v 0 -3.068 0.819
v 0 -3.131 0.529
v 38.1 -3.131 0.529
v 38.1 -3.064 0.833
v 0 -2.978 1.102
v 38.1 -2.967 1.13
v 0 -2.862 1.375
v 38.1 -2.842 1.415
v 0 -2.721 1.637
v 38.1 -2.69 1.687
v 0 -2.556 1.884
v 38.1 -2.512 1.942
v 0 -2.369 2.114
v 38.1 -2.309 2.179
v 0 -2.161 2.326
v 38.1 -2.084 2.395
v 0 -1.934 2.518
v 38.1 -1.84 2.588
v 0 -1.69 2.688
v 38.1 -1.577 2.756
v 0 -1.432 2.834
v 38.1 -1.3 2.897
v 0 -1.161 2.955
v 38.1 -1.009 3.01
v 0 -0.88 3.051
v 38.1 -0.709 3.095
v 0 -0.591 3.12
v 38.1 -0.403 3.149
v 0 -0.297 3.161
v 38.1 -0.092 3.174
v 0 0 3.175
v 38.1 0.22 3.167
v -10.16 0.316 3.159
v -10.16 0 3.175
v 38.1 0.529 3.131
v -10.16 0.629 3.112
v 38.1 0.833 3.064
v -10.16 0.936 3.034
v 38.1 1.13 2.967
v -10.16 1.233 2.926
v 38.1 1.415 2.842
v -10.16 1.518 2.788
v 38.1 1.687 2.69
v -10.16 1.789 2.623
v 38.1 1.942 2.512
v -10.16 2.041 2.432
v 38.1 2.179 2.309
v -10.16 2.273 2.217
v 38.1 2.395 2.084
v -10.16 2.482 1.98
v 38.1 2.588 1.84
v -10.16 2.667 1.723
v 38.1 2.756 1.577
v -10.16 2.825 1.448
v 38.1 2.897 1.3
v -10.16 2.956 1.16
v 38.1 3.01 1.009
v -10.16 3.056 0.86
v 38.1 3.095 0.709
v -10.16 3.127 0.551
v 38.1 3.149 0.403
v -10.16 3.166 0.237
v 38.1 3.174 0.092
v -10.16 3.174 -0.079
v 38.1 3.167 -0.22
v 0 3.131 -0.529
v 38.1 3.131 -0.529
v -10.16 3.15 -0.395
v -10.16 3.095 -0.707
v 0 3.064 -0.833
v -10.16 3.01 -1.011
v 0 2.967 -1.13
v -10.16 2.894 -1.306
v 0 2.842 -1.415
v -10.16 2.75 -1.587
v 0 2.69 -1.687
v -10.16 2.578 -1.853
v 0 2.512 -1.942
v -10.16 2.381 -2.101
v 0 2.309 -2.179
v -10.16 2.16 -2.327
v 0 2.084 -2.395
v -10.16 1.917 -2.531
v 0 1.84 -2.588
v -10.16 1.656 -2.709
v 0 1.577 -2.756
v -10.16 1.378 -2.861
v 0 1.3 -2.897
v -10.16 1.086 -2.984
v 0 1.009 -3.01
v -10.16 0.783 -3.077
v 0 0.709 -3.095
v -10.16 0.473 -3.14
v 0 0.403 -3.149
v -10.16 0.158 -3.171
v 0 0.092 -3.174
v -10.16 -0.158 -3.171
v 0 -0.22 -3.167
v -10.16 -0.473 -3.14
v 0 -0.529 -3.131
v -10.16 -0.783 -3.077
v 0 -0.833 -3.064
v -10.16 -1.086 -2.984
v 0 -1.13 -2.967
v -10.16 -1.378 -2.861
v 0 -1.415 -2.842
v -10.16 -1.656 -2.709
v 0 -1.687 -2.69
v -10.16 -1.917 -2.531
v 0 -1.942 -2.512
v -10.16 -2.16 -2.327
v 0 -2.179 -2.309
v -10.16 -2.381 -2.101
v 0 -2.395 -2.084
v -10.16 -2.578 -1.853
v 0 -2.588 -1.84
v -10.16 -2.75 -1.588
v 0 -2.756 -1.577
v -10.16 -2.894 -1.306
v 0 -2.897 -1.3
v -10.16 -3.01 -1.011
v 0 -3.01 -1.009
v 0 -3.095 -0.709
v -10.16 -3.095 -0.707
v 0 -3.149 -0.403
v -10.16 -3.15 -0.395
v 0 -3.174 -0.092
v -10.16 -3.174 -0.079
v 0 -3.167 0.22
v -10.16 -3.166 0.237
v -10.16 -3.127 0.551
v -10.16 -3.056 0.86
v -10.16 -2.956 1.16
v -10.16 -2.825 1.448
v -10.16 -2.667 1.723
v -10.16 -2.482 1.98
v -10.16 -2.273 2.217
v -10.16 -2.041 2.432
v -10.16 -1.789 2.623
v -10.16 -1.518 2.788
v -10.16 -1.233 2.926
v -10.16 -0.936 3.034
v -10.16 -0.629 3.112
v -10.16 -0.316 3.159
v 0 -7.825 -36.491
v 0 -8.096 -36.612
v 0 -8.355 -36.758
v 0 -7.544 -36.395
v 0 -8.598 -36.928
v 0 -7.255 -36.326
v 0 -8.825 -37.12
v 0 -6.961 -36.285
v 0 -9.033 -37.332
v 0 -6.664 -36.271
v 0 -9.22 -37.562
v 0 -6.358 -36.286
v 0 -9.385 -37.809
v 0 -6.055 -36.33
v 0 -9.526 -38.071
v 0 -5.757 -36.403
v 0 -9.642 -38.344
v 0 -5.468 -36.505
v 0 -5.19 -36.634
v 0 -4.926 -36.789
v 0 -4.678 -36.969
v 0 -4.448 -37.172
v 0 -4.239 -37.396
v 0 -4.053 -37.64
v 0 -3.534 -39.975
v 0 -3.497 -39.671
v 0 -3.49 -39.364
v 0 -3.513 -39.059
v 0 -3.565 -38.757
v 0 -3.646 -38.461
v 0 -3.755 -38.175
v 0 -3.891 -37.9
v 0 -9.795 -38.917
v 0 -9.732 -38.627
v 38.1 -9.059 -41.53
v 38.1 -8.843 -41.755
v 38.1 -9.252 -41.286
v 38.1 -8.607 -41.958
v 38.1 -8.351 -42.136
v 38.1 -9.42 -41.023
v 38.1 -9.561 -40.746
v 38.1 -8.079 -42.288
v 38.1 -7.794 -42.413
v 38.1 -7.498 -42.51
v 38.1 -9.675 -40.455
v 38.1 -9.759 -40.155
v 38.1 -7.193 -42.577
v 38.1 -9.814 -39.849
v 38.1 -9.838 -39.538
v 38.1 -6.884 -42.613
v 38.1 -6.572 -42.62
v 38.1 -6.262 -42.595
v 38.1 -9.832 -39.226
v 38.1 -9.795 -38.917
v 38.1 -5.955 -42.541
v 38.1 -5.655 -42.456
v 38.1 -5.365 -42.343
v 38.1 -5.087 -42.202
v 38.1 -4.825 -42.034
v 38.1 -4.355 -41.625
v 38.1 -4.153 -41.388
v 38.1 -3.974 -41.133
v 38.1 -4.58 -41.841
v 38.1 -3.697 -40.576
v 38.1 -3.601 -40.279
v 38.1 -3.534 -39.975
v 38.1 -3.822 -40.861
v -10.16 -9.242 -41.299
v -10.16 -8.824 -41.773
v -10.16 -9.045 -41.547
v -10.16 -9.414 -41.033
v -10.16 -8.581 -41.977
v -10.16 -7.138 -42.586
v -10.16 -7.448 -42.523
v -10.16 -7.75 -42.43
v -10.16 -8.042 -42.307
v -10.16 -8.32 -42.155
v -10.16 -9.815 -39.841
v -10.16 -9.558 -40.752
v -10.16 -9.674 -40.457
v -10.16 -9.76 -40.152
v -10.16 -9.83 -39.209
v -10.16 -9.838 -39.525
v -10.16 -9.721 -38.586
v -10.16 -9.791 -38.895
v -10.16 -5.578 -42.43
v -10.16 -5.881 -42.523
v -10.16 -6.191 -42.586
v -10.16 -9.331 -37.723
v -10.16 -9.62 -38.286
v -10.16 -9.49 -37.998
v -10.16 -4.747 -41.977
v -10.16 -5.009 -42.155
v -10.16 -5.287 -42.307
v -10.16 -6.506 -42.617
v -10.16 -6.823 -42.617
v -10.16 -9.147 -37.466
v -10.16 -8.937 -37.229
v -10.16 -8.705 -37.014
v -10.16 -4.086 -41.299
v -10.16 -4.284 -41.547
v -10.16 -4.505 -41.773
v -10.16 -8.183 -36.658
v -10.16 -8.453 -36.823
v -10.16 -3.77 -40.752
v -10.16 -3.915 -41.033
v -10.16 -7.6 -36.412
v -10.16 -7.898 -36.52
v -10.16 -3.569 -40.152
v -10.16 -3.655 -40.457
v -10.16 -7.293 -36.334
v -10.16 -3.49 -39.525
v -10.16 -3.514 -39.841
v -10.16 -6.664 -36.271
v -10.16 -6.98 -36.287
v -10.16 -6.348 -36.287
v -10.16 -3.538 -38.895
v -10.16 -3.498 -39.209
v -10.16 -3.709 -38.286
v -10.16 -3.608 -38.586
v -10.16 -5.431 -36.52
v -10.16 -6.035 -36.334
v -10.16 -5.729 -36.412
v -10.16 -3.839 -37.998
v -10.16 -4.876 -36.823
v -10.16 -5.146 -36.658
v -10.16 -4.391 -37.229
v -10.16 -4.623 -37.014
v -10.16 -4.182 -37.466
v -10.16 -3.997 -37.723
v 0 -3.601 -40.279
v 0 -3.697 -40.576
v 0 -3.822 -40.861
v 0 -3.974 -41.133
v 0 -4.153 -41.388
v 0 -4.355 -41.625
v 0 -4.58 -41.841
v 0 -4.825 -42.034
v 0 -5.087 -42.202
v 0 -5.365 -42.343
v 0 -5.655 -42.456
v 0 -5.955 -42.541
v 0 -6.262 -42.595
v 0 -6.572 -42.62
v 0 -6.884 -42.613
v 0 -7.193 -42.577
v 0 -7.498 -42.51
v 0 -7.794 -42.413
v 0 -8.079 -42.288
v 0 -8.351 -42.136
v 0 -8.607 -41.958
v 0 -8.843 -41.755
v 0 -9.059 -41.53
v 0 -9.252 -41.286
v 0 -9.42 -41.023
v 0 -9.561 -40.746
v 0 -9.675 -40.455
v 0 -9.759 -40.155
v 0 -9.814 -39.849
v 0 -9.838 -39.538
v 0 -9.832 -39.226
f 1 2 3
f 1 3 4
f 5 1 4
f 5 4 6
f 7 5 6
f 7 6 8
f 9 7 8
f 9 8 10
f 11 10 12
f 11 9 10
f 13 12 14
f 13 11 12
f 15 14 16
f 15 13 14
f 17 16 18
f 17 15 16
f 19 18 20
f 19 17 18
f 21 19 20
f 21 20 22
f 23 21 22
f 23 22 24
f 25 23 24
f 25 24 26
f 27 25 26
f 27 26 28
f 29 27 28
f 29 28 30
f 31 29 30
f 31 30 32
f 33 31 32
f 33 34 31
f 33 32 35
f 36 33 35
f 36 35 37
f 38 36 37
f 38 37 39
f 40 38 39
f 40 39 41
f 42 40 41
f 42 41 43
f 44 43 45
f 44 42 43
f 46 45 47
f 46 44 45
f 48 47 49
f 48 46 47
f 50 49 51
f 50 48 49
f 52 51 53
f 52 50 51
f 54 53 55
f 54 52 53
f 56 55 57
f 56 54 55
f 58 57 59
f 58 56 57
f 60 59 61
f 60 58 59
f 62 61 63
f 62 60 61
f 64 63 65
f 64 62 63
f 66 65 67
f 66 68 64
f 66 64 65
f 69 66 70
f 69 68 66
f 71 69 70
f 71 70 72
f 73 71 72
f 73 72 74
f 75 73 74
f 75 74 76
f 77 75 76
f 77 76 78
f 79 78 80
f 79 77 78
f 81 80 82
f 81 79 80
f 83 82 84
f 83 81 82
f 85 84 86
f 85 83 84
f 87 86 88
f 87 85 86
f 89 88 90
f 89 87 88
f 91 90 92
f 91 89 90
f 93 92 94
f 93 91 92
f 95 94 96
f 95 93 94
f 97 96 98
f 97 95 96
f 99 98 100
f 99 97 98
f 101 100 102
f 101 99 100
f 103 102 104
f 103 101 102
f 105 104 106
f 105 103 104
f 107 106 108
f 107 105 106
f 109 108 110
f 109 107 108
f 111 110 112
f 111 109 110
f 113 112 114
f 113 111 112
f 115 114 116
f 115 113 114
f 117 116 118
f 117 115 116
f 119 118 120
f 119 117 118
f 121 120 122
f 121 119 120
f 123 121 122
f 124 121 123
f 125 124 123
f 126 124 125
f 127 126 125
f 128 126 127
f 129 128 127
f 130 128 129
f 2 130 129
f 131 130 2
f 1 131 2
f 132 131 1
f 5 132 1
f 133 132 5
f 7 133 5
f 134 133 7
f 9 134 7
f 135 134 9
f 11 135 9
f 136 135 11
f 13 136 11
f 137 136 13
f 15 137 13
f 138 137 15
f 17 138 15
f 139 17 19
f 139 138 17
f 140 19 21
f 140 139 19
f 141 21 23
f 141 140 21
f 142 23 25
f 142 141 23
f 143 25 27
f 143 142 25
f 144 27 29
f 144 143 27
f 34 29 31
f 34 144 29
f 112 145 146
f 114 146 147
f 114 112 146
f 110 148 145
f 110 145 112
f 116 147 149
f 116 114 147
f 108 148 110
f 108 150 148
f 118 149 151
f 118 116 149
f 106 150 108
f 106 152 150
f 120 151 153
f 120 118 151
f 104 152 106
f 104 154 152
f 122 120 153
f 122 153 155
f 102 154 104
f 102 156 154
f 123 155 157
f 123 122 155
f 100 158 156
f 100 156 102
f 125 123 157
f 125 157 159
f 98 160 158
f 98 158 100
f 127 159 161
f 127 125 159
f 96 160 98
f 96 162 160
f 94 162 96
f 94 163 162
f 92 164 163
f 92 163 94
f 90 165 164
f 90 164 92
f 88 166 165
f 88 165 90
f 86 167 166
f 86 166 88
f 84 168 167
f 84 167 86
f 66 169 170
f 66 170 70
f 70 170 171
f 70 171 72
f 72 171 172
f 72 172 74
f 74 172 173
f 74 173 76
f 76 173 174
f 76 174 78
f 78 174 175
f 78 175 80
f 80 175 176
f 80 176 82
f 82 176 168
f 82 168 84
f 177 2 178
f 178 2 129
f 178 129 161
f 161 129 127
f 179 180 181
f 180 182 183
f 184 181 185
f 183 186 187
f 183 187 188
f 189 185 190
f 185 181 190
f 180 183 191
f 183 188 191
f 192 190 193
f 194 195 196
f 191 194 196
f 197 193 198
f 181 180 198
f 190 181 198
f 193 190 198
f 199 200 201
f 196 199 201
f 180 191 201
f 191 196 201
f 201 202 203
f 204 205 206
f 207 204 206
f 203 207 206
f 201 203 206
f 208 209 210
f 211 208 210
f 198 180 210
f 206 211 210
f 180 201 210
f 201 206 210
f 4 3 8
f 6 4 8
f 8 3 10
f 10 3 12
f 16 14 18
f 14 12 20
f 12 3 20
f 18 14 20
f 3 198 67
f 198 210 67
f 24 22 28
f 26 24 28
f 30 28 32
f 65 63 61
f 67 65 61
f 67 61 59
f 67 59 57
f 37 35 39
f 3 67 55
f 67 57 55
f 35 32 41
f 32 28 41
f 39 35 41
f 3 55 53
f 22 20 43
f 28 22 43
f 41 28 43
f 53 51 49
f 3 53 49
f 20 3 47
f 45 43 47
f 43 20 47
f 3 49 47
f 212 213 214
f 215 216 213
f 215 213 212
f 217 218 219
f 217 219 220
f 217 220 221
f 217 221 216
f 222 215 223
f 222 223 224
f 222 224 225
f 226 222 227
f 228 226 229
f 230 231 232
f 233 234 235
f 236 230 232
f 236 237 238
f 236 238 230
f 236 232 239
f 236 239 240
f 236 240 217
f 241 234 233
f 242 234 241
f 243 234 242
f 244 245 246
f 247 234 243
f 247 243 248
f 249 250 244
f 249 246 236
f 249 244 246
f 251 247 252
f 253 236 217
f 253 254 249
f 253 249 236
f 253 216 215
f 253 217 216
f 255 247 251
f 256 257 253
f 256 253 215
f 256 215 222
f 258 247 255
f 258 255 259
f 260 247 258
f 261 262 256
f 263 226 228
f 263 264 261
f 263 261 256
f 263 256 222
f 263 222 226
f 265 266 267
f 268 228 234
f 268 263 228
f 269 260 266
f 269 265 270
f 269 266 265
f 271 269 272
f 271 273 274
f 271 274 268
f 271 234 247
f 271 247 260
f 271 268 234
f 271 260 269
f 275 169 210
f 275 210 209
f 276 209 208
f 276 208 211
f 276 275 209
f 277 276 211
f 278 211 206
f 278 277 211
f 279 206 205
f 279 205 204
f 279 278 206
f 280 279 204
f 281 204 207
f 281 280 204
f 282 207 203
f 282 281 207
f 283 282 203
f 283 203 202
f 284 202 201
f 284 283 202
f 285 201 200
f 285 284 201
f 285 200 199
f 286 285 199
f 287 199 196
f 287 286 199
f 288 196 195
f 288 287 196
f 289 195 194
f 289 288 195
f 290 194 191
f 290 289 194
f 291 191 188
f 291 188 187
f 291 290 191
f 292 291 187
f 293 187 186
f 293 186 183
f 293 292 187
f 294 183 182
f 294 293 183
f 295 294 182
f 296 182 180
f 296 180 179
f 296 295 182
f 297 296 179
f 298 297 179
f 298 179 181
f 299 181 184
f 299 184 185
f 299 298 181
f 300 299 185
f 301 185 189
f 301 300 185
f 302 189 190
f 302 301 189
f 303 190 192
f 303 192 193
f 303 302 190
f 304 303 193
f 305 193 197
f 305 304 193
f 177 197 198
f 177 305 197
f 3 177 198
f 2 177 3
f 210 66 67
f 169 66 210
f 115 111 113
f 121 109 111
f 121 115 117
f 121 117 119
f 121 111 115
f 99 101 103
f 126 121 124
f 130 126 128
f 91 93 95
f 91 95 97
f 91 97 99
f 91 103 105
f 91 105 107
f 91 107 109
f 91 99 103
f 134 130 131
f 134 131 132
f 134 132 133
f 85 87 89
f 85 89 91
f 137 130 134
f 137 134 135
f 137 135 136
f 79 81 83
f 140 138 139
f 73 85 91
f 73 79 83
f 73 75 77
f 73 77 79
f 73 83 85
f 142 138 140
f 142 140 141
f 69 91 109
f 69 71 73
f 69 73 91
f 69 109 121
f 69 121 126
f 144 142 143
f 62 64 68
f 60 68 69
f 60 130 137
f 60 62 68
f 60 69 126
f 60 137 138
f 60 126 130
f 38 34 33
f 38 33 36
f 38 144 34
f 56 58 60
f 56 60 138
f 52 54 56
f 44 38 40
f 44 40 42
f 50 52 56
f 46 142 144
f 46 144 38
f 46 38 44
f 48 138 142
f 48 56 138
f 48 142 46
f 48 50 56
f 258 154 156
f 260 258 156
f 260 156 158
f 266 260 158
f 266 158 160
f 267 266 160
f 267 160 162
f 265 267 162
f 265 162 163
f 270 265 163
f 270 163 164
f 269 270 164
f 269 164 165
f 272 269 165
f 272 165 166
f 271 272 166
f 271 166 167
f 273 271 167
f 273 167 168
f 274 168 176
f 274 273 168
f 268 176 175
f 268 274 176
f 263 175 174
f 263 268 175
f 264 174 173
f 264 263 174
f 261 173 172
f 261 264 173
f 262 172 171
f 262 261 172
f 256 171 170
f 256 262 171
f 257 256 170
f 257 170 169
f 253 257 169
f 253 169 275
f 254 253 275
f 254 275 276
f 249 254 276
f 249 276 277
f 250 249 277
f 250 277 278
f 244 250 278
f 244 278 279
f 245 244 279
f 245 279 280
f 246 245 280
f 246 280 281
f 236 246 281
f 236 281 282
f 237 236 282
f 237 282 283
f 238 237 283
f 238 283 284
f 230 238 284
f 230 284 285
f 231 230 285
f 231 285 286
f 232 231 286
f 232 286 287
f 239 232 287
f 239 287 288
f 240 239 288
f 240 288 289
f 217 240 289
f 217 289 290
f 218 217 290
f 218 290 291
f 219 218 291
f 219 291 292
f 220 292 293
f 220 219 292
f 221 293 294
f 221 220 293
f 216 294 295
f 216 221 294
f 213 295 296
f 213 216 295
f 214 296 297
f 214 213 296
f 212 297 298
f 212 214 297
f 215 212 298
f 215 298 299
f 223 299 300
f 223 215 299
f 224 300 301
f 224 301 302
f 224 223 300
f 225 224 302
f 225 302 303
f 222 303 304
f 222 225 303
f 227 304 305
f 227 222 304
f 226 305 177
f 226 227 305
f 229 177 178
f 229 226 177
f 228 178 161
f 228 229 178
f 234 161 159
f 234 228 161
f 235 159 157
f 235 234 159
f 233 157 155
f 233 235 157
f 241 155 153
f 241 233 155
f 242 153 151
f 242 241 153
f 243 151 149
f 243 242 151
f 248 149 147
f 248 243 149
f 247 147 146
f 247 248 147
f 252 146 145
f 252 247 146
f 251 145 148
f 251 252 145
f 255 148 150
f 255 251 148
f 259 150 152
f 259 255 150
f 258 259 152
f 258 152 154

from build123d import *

# Parameters (mm, degrees)
BOSS_EXTRUDE1_DEPTH = 38.1
BOSS_EXTRUDE2_START = 10.16
SKETCH2_R           = 3.175
BOSS_EXTRUDE2_DEPTH = 10.16


with BuildPart() as part:
    # Sketch1 → Boss-Extrude1 (new body)
    with BuildSketch(Plane(origin=(0, 0, 0), x_dir=(0, 0, -1), z_dir=(1, 0, 0))):
        with BuildLine():
            Line((0.528916607, 3.130634476), (39.974911006, -3.533714773))
            ThreePointArc((39.974911006, -3.533714773), (42.576628875, -7.193265857), (38.917077791, -9.794983726))
            Line((38.917077791, -9.794983726), (-0.528916607, -3.130634476))
            ThreePointArc((-0.528916607, -3.130634476), (-3.130634476, 0.528916607), (0.528916607, 3.130634476))
        make_face()
    extrude(amount=BOSS_EXTRUDE1_DEPTH)

    # Sketch2 → Boss-Extrude2 (add)
    with BuildSketch(Plane.ZY.offset(BOSS_EXTRUDE2_START)):
        with Locations((-39.445994398, -6.664349249)):
            Circle(SKETCH2_R)
        Circle(SKETCH2_R)
    extrude(amount=-BOSS_EXTRUDE2_DEPTH)


solid = part.part
